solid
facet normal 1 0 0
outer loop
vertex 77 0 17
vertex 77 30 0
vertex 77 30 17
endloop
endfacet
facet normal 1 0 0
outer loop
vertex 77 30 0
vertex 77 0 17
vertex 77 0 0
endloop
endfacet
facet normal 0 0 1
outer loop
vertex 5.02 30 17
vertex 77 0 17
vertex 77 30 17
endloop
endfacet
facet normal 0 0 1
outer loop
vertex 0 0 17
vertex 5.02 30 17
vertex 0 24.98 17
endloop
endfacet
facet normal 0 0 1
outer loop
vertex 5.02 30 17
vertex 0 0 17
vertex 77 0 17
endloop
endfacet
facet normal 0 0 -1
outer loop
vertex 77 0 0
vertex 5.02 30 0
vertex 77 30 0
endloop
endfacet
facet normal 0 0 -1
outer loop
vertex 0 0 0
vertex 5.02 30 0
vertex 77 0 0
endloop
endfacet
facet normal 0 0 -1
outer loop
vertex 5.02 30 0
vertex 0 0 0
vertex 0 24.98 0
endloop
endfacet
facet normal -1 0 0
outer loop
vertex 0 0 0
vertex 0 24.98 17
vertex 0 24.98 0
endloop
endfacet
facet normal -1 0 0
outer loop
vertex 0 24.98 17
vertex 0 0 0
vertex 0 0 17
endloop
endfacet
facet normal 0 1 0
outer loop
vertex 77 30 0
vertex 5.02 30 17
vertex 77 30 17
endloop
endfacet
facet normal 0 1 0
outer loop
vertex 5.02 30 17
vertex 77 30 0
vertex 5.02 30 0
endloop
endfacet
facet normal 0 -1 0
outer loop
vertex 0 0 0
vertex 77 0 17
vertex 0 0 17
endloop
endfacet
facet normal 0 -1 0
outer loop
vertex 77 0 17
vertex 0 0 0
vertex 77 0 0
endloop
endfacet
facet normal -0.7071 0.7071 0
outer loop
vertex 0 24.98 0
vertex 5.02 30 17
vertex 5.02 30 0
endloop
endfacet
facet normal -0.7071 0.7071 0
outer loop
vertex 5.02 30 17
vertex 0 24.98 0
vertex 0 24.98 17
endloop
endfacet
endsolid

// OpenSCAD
// 
/*
 *  Y Idler Bracket for Mendel
 *  by Timothy Schmidt.
 *
 *  This program is free software; you can redistribute it and/or modify
 *  it under the terms of the GNU General Public License as published by
 *  the Free Software Foundation; either version 2 of the License, or
 *  (at your option) any later version.
 *
 *  This program is distributed in the hope that it will be useful,
 *  but WITHOUT ANY WARRANTY; without even the implied warranty of
 *  MERCHANTABILITY or FITNESS FOR A PARTICULAR PURPOSE.  See the
 *  GNU General Public License for more details.
 *
 *  You should have received a copy of the GNU General Public License
 *  along with this program; if not, write to the Free Software
 *  Foundation, Inc., 59 Temple Place, Suite 330, Boston, MA  02111-1307  USA
 *
*/

difference () {
	cube(size=[77,30,17]);
	translate(v=[0,24.98,0]) rotate(v=0,45,0) cube(size=[7.1,7.1,17]);
	
}
